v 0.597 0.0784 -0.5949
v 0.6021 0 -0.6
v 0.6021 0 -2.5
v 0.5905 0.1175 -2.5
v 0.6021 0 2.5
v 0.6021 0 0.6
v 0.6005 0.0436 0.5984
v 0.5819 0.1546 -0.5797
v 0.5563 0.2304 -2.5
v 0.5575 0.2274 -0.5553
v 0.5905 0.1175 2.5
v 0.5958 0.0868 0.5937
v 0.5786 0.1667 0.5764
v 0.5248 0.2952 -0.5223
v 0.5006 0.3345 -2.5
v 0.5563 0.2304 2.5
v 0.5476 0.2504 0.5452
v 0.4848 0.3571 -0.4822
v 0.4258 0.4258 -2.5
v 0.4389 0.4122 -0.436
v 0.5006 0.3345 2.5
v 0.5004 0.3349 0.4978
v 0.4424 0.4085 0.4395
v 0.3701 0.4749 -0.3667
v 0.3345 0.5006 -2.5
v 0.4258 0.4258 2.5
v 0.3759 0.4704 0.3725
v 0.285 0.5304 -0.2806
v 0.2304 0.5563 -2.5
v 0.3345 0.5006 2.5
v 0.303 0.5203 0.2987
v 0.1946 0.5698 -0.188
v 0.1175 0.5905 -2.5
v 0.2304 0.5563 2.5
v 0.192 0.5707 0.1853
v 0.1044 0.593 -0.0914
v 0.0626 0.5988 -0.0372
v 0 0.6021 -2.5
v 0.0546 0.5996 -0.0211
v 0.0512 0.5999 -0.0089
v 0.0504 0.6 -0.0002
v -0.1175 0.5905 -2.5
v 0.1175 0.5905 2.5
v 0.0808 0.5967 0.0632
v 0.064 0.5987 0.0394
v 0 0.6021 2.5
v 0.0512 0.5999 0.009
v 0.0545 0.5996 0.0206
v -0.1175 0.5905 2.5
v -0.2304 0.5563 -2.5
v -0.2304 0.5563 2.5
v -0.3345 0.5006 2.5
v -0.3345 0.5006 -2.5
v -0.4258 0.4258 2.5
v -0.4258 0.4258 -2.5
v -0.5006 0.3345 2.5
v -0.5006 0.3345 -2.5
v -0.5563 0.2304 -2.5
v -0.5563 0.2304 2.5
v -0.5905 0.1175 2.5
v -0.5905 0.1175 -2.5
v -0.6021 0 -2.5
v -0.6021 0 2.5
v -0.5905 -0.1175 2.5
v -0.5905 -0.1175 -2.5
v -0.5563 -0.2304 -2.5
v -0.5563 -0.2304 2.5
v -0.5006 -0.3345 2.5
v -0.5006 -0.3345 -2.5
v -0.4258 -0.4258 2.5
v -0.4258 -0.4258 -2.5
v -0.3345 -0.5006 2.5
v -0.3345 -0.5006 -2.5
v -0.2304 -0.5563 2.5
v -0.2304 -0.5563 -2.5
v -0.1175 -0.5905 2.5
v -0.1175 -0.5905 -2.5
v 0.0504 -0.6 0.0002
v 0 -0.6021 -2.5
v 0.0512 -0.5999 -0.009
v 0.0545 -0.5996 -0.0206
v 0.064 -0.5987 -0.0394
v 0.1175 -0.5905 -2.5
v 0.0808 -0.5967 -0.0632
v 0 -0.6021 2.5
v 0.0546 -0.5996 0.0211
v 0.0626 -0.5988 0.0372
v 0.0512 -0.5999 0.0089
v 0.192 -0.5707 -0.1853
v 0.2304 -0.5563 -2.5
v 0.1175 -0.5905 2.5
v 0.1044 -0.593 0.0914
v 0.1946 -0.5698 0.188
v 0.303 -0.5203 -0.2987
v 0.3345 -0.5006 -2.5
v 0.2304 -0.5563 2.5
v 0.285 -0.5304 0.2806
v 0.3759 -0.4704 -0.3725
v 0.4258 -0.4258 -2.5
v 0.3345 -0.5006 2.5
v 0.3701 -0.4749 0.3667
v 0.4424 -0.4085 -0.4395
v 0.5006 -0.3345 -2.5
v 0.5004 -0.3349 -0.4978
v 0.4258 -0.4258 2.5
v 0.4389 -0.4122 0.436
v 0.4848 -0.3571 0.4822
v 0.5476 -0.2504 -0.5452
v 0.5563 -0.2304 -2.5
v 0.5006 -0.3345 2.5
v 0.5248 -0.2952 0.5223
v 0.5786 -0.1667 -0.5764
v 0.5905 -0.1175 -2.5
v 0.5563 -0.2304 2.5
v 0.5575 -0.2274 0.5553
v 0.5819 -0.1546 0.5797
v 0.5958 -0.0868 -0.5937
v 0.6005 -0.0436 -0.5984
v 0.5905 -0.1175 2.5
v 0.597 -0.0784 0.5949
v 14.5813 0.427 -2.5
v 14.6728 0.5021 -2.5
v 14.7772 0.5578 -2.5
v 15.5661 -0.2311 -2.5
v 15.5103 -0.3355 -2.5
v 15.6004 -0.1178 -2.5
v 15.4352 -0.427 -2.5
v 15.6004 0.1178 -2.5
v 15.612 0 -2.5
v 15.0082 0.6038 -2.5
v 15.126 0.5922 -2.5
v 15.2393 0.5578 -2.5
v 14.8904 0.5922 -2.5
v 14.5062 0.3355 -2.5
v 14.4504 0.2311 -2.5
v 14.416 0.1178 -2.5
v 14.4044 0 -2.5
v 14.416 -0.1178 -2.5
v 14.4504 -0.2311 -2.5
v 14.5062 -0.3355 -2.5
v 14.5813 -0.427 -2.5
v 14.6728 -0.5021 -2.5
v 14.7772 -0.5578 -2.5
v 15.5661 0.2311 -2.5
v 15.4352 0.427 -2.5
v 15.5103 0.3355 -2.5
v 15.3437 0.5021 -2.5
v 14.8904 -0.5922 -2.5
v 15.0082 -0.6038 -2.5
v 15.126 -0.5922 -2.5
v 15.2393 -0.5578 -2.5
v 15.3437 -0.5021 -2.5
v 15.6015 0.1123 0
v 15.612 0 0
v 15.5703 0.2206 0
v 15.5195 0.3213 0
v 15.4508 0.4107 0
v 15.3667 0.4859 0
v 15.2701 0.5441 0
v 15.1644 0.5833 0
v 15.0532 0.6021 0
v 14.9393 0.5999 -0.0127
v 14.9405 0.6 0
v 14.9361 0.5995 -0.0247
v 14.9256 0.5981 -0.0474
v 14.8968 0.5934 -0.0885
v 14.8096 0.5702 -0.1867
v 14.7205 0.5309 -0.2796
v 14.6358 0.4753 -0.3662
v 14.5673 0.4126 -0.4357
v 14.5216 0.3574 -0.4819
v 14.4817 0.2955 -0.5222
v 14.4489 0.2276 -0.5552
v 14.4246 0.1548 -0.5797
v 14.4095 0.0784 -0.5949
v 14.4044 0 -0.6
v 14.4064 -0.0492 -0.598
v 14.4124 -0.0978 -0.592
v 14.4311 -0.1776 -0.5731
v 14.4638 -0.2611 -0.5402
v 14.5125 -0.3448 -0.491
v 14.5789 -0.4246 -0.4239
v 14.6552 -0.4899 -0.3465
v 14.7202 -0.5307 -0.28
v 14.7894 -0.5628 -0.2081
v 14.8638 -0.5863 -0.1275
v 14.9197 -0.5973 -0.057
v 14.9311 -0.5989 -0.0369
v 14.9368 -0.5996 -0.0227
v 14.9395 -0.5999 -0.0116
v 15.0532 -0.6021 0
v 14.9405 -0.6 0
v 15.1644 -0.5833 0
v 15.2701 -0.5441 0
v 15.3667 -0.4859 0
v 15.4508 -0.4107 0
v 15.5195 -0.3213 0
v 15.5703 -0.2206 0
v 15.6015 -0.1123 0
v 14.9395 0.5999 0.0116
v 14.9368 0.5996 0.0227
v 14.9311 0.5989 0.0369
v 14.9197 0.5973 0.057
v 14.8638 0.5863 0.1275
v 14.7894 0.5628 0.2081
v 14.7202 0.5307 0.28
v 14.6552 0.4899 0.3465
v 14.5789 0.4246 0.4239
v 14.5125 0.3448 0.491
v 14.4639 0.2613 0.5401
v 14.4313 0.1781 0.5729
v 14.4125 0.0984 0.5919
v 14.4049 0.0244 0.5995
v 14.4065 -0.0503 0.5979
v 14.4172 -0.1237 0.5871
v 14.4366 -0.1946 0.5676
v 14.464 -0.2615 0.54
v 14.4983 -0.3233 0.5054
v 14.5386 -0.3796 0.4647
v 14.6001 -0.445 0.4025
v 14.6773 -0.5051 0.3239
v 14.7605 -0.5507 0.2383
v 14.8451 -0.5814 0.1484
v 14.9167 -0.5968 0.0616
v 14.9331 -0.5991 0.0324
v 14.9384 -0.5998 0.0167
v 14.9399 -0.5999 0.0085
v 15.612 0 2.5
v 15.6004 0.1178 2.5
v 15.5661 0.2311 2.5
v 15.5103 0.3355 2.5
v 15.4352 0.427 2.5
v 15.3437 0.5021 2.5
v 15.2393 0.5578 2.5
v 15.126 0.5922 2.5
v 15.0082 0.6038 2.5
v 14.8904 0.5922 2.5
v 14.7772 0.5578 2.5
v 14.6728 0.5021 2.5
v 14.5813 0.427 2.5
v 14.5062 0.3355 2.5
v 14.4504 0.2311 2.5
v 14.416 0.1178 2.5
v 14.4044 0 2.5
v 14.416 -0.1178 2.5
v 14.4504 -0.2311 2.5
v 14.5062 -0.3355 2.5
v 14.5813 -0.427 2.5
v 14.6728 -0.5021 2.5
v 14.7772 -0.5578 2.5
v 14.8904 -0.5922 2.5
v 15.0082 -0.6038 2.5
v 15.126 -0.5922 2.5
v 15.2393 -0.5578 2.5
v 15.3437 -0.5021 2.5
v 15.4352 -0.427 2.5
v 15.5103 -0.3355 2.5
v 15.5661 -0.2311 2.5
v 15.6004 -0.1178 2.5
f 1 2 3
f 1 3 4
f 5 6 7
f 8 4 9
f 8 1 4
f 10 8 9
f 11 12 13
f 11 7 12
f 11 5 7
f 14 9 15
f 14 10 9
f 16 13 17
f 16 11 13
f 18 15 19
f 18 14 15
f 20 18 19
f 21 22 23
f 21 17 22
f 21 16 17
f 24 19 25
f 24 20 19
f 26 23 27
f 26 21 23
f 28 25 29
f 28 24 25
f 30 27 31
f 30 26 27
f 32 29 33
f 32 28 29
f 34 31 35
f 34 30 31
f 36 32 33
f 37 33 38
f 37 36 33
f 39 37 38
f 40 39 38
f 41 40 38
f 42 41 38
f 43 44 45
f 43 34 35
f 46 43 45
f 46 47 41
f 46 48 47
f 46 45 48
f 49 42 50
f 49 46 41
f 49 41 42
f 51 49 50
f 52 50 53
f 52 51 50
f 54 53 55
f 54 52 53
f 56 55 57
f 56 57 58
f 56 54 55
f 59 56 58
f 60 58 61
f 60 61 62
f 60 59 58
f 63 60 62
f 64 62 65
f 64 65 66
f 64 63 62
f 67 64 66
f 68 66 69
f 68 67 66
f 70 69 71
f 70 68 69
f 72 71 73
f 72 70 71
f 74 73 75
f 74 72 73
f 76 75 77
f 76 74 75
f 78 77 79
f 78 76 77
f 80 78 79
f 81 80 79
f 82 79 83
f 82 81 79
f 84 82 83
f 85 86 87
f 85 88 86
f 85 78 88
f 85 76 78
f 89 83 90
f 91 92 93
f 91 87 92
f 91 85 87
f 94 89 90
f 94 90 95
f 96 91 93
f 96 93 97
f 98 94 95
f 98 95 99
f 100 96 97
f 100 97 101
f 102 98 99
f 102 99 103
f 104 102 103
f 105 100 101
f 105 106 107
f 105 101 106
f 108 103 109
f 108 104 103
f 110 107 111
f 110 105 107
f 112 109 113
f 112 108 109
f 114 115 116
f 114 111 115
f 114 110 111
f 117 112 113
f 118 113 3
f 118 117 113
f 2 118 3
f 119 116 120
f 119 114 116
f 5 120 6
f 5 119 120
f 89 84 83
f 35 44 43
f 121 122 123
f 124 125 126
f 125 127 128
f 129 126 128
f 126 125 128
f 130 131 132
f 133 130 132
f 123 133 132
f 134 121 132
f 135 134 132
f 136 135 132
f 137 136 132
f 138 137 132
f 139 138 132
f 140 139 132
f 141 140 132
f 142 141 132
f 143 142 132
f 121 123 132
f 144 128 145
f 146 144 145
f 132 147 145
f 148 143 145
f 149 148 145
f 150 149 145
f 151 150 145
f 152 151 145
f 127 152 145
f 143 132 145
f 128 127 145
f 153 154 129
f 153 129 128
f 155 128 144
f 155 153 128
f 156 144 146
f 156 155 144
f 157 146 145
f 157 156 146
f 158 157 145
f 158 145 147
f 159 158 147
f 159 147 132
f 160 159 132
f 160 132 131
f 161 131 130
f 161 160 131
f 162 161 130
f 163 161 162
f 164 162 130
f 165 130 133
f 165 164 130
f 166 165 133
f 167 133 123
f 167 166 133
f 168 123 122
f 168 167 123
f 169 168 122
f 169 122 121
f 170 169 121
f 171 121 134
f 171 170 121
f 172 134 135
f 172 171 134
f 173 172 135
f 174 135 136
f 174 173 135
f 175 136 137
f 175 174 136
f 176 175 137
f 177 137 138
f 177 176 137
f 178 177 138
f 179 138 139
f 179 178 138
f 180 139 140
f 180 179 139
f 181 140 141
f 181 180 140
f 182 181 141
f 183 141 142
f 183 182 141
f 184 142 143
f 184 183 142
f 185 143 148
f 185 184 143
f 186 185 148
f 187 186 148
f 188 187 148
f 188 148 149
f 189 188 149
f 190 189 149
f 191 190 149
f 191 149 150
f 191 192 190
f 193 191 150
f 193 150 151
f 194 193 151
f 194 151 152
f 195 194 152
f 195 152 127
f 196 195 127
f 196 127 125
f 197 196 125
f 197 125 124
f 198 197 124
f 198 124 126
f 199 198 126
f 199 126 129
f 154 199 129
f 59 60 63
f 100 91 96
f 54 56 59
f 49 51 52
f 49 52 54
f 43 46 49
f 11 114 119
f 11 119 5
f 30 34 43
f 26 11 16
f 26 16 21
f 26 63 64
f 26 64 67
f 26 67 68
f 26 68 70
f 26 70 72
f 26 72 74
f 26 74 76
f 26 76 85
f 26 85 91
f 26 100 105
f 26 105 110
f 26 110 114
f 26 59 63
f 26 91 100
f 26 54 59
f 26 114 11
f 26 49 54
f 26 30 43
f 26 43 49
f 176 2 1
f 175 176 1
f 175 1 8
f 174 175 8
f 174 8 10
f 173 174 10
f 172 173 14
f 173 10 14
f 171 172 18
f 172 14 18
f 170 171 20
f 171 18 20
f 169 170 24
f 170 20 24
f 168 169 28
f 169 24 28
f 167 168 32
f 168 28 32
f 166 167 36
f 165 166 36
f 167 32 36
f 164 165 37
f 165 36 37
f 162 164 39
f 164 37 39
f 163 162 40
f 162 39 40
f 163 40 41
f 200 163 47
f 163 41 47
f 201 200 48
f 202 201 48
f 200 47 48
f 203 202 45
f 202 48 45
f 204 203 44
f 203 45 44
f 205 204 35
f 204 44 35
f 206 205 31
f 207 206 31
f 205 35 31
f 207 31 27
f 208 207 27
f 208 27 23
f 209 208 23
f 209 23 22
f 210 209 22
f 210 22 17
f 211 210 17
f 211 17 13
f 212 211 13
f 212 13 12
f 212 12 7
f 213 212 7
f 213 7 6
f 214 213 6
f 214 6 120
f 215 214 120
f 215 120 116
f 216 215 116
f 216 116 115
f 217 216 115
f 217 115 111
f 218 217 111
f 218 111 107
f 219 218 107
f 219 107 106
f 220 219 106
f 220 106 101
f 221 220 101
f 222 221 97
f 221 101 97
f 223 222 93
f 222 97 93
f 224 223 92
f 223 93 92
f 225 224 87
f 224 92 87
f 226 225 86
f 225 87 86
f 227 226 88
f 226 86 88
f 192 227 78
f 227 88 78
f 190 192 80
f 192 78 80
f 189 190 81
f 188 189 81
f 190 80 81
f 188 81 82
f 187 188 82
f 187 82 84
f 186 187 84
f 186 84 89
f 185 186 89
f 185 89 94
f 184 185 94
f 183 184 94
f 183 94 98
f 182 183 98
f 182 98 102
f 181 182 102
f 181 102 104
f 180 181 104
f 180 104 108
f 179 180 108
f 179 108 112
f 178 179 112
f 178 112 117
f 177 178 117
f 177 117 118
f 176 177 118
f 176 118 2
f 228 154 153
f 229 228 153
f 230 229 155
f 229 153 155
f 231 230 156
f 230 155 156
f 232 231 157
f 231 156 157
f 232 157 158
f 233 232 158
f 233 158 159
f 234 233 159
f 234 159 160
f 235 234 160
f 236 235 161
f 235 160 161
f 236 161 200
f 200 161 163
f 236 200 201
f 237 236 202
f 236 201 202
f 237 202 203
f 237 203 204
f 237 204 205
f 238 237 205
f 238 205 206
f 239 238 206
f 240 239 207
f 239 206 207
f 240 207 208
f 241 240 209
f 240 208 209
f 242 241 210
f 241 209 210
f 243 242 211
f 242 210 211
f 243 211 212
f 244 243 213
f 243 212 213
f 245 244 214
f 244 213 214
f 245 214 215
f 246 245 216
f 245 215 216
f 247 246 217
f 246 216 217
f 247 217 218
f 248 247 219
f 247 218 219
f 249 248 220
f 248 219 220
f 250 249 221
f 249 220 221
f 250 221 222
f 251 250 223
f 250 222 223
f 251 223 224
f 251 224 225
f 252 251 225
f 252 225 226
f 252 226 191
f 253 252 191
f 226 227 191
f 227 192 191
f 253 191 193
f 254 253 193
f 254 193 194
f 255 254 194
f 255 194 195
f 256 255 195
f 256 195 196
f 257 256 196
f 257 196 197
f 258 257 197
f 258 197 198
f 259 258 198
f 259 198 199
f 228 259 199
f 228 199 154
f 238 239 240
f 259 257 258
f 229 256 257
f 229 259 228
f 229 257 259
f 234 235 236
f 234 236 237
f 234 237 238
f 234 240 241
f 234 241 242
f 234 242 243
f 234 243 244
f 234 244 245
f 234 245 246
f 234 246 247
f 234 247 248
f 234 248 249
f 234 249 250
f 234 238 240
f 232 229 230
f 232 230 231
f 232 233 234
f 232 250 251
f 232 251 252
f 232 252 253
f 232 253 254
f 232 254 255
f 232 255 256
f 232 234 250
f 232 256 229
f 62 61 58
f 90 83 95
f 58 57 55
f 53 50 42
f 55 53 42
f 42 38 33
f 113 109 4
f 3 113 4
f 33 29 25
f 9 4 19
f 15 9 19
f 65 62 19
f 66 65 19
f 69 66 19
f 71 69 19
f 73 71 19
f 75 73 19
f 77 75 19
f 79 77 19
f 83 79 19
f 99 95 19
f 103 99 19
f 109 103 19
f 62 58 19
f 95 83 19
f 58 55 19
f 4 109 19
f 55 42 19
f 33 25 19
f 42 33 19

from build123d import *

# Parameters (mm, degrees)
SKETCH_1_R      = 0.6
EXTRUDE_1_DEPTH = 15
SKETCH_2_R      = 0.60381225
SKETCH_2_R_2    = 0.602112423
EXTRUDE_2_DEPTH = 2.5


with BuildPart() as part:
    # 草图1 → 凸台-拉伸1 (new body)
    with BuildSketch(Plane(origin=(0, 0, 0), x_dir=(0, 0, -1), z_dir=(1, 0, 0))):
        Circle(SKETCH_1_R)
    extrude(amount=EXTRUDE_1_DEPTH)

    # 草图2 → 凸台-拉伸2 (add, symmetric)
    with BuildSketch(Plane.XY):
        with Locations((15.00822403, 0)):
            Circle(SKETCH_2_R)
        Circle(SKETCH_2_R_2)
    extrude(amount=EXTRUDE_2_DEPTH, both=True)


solid = part.part
